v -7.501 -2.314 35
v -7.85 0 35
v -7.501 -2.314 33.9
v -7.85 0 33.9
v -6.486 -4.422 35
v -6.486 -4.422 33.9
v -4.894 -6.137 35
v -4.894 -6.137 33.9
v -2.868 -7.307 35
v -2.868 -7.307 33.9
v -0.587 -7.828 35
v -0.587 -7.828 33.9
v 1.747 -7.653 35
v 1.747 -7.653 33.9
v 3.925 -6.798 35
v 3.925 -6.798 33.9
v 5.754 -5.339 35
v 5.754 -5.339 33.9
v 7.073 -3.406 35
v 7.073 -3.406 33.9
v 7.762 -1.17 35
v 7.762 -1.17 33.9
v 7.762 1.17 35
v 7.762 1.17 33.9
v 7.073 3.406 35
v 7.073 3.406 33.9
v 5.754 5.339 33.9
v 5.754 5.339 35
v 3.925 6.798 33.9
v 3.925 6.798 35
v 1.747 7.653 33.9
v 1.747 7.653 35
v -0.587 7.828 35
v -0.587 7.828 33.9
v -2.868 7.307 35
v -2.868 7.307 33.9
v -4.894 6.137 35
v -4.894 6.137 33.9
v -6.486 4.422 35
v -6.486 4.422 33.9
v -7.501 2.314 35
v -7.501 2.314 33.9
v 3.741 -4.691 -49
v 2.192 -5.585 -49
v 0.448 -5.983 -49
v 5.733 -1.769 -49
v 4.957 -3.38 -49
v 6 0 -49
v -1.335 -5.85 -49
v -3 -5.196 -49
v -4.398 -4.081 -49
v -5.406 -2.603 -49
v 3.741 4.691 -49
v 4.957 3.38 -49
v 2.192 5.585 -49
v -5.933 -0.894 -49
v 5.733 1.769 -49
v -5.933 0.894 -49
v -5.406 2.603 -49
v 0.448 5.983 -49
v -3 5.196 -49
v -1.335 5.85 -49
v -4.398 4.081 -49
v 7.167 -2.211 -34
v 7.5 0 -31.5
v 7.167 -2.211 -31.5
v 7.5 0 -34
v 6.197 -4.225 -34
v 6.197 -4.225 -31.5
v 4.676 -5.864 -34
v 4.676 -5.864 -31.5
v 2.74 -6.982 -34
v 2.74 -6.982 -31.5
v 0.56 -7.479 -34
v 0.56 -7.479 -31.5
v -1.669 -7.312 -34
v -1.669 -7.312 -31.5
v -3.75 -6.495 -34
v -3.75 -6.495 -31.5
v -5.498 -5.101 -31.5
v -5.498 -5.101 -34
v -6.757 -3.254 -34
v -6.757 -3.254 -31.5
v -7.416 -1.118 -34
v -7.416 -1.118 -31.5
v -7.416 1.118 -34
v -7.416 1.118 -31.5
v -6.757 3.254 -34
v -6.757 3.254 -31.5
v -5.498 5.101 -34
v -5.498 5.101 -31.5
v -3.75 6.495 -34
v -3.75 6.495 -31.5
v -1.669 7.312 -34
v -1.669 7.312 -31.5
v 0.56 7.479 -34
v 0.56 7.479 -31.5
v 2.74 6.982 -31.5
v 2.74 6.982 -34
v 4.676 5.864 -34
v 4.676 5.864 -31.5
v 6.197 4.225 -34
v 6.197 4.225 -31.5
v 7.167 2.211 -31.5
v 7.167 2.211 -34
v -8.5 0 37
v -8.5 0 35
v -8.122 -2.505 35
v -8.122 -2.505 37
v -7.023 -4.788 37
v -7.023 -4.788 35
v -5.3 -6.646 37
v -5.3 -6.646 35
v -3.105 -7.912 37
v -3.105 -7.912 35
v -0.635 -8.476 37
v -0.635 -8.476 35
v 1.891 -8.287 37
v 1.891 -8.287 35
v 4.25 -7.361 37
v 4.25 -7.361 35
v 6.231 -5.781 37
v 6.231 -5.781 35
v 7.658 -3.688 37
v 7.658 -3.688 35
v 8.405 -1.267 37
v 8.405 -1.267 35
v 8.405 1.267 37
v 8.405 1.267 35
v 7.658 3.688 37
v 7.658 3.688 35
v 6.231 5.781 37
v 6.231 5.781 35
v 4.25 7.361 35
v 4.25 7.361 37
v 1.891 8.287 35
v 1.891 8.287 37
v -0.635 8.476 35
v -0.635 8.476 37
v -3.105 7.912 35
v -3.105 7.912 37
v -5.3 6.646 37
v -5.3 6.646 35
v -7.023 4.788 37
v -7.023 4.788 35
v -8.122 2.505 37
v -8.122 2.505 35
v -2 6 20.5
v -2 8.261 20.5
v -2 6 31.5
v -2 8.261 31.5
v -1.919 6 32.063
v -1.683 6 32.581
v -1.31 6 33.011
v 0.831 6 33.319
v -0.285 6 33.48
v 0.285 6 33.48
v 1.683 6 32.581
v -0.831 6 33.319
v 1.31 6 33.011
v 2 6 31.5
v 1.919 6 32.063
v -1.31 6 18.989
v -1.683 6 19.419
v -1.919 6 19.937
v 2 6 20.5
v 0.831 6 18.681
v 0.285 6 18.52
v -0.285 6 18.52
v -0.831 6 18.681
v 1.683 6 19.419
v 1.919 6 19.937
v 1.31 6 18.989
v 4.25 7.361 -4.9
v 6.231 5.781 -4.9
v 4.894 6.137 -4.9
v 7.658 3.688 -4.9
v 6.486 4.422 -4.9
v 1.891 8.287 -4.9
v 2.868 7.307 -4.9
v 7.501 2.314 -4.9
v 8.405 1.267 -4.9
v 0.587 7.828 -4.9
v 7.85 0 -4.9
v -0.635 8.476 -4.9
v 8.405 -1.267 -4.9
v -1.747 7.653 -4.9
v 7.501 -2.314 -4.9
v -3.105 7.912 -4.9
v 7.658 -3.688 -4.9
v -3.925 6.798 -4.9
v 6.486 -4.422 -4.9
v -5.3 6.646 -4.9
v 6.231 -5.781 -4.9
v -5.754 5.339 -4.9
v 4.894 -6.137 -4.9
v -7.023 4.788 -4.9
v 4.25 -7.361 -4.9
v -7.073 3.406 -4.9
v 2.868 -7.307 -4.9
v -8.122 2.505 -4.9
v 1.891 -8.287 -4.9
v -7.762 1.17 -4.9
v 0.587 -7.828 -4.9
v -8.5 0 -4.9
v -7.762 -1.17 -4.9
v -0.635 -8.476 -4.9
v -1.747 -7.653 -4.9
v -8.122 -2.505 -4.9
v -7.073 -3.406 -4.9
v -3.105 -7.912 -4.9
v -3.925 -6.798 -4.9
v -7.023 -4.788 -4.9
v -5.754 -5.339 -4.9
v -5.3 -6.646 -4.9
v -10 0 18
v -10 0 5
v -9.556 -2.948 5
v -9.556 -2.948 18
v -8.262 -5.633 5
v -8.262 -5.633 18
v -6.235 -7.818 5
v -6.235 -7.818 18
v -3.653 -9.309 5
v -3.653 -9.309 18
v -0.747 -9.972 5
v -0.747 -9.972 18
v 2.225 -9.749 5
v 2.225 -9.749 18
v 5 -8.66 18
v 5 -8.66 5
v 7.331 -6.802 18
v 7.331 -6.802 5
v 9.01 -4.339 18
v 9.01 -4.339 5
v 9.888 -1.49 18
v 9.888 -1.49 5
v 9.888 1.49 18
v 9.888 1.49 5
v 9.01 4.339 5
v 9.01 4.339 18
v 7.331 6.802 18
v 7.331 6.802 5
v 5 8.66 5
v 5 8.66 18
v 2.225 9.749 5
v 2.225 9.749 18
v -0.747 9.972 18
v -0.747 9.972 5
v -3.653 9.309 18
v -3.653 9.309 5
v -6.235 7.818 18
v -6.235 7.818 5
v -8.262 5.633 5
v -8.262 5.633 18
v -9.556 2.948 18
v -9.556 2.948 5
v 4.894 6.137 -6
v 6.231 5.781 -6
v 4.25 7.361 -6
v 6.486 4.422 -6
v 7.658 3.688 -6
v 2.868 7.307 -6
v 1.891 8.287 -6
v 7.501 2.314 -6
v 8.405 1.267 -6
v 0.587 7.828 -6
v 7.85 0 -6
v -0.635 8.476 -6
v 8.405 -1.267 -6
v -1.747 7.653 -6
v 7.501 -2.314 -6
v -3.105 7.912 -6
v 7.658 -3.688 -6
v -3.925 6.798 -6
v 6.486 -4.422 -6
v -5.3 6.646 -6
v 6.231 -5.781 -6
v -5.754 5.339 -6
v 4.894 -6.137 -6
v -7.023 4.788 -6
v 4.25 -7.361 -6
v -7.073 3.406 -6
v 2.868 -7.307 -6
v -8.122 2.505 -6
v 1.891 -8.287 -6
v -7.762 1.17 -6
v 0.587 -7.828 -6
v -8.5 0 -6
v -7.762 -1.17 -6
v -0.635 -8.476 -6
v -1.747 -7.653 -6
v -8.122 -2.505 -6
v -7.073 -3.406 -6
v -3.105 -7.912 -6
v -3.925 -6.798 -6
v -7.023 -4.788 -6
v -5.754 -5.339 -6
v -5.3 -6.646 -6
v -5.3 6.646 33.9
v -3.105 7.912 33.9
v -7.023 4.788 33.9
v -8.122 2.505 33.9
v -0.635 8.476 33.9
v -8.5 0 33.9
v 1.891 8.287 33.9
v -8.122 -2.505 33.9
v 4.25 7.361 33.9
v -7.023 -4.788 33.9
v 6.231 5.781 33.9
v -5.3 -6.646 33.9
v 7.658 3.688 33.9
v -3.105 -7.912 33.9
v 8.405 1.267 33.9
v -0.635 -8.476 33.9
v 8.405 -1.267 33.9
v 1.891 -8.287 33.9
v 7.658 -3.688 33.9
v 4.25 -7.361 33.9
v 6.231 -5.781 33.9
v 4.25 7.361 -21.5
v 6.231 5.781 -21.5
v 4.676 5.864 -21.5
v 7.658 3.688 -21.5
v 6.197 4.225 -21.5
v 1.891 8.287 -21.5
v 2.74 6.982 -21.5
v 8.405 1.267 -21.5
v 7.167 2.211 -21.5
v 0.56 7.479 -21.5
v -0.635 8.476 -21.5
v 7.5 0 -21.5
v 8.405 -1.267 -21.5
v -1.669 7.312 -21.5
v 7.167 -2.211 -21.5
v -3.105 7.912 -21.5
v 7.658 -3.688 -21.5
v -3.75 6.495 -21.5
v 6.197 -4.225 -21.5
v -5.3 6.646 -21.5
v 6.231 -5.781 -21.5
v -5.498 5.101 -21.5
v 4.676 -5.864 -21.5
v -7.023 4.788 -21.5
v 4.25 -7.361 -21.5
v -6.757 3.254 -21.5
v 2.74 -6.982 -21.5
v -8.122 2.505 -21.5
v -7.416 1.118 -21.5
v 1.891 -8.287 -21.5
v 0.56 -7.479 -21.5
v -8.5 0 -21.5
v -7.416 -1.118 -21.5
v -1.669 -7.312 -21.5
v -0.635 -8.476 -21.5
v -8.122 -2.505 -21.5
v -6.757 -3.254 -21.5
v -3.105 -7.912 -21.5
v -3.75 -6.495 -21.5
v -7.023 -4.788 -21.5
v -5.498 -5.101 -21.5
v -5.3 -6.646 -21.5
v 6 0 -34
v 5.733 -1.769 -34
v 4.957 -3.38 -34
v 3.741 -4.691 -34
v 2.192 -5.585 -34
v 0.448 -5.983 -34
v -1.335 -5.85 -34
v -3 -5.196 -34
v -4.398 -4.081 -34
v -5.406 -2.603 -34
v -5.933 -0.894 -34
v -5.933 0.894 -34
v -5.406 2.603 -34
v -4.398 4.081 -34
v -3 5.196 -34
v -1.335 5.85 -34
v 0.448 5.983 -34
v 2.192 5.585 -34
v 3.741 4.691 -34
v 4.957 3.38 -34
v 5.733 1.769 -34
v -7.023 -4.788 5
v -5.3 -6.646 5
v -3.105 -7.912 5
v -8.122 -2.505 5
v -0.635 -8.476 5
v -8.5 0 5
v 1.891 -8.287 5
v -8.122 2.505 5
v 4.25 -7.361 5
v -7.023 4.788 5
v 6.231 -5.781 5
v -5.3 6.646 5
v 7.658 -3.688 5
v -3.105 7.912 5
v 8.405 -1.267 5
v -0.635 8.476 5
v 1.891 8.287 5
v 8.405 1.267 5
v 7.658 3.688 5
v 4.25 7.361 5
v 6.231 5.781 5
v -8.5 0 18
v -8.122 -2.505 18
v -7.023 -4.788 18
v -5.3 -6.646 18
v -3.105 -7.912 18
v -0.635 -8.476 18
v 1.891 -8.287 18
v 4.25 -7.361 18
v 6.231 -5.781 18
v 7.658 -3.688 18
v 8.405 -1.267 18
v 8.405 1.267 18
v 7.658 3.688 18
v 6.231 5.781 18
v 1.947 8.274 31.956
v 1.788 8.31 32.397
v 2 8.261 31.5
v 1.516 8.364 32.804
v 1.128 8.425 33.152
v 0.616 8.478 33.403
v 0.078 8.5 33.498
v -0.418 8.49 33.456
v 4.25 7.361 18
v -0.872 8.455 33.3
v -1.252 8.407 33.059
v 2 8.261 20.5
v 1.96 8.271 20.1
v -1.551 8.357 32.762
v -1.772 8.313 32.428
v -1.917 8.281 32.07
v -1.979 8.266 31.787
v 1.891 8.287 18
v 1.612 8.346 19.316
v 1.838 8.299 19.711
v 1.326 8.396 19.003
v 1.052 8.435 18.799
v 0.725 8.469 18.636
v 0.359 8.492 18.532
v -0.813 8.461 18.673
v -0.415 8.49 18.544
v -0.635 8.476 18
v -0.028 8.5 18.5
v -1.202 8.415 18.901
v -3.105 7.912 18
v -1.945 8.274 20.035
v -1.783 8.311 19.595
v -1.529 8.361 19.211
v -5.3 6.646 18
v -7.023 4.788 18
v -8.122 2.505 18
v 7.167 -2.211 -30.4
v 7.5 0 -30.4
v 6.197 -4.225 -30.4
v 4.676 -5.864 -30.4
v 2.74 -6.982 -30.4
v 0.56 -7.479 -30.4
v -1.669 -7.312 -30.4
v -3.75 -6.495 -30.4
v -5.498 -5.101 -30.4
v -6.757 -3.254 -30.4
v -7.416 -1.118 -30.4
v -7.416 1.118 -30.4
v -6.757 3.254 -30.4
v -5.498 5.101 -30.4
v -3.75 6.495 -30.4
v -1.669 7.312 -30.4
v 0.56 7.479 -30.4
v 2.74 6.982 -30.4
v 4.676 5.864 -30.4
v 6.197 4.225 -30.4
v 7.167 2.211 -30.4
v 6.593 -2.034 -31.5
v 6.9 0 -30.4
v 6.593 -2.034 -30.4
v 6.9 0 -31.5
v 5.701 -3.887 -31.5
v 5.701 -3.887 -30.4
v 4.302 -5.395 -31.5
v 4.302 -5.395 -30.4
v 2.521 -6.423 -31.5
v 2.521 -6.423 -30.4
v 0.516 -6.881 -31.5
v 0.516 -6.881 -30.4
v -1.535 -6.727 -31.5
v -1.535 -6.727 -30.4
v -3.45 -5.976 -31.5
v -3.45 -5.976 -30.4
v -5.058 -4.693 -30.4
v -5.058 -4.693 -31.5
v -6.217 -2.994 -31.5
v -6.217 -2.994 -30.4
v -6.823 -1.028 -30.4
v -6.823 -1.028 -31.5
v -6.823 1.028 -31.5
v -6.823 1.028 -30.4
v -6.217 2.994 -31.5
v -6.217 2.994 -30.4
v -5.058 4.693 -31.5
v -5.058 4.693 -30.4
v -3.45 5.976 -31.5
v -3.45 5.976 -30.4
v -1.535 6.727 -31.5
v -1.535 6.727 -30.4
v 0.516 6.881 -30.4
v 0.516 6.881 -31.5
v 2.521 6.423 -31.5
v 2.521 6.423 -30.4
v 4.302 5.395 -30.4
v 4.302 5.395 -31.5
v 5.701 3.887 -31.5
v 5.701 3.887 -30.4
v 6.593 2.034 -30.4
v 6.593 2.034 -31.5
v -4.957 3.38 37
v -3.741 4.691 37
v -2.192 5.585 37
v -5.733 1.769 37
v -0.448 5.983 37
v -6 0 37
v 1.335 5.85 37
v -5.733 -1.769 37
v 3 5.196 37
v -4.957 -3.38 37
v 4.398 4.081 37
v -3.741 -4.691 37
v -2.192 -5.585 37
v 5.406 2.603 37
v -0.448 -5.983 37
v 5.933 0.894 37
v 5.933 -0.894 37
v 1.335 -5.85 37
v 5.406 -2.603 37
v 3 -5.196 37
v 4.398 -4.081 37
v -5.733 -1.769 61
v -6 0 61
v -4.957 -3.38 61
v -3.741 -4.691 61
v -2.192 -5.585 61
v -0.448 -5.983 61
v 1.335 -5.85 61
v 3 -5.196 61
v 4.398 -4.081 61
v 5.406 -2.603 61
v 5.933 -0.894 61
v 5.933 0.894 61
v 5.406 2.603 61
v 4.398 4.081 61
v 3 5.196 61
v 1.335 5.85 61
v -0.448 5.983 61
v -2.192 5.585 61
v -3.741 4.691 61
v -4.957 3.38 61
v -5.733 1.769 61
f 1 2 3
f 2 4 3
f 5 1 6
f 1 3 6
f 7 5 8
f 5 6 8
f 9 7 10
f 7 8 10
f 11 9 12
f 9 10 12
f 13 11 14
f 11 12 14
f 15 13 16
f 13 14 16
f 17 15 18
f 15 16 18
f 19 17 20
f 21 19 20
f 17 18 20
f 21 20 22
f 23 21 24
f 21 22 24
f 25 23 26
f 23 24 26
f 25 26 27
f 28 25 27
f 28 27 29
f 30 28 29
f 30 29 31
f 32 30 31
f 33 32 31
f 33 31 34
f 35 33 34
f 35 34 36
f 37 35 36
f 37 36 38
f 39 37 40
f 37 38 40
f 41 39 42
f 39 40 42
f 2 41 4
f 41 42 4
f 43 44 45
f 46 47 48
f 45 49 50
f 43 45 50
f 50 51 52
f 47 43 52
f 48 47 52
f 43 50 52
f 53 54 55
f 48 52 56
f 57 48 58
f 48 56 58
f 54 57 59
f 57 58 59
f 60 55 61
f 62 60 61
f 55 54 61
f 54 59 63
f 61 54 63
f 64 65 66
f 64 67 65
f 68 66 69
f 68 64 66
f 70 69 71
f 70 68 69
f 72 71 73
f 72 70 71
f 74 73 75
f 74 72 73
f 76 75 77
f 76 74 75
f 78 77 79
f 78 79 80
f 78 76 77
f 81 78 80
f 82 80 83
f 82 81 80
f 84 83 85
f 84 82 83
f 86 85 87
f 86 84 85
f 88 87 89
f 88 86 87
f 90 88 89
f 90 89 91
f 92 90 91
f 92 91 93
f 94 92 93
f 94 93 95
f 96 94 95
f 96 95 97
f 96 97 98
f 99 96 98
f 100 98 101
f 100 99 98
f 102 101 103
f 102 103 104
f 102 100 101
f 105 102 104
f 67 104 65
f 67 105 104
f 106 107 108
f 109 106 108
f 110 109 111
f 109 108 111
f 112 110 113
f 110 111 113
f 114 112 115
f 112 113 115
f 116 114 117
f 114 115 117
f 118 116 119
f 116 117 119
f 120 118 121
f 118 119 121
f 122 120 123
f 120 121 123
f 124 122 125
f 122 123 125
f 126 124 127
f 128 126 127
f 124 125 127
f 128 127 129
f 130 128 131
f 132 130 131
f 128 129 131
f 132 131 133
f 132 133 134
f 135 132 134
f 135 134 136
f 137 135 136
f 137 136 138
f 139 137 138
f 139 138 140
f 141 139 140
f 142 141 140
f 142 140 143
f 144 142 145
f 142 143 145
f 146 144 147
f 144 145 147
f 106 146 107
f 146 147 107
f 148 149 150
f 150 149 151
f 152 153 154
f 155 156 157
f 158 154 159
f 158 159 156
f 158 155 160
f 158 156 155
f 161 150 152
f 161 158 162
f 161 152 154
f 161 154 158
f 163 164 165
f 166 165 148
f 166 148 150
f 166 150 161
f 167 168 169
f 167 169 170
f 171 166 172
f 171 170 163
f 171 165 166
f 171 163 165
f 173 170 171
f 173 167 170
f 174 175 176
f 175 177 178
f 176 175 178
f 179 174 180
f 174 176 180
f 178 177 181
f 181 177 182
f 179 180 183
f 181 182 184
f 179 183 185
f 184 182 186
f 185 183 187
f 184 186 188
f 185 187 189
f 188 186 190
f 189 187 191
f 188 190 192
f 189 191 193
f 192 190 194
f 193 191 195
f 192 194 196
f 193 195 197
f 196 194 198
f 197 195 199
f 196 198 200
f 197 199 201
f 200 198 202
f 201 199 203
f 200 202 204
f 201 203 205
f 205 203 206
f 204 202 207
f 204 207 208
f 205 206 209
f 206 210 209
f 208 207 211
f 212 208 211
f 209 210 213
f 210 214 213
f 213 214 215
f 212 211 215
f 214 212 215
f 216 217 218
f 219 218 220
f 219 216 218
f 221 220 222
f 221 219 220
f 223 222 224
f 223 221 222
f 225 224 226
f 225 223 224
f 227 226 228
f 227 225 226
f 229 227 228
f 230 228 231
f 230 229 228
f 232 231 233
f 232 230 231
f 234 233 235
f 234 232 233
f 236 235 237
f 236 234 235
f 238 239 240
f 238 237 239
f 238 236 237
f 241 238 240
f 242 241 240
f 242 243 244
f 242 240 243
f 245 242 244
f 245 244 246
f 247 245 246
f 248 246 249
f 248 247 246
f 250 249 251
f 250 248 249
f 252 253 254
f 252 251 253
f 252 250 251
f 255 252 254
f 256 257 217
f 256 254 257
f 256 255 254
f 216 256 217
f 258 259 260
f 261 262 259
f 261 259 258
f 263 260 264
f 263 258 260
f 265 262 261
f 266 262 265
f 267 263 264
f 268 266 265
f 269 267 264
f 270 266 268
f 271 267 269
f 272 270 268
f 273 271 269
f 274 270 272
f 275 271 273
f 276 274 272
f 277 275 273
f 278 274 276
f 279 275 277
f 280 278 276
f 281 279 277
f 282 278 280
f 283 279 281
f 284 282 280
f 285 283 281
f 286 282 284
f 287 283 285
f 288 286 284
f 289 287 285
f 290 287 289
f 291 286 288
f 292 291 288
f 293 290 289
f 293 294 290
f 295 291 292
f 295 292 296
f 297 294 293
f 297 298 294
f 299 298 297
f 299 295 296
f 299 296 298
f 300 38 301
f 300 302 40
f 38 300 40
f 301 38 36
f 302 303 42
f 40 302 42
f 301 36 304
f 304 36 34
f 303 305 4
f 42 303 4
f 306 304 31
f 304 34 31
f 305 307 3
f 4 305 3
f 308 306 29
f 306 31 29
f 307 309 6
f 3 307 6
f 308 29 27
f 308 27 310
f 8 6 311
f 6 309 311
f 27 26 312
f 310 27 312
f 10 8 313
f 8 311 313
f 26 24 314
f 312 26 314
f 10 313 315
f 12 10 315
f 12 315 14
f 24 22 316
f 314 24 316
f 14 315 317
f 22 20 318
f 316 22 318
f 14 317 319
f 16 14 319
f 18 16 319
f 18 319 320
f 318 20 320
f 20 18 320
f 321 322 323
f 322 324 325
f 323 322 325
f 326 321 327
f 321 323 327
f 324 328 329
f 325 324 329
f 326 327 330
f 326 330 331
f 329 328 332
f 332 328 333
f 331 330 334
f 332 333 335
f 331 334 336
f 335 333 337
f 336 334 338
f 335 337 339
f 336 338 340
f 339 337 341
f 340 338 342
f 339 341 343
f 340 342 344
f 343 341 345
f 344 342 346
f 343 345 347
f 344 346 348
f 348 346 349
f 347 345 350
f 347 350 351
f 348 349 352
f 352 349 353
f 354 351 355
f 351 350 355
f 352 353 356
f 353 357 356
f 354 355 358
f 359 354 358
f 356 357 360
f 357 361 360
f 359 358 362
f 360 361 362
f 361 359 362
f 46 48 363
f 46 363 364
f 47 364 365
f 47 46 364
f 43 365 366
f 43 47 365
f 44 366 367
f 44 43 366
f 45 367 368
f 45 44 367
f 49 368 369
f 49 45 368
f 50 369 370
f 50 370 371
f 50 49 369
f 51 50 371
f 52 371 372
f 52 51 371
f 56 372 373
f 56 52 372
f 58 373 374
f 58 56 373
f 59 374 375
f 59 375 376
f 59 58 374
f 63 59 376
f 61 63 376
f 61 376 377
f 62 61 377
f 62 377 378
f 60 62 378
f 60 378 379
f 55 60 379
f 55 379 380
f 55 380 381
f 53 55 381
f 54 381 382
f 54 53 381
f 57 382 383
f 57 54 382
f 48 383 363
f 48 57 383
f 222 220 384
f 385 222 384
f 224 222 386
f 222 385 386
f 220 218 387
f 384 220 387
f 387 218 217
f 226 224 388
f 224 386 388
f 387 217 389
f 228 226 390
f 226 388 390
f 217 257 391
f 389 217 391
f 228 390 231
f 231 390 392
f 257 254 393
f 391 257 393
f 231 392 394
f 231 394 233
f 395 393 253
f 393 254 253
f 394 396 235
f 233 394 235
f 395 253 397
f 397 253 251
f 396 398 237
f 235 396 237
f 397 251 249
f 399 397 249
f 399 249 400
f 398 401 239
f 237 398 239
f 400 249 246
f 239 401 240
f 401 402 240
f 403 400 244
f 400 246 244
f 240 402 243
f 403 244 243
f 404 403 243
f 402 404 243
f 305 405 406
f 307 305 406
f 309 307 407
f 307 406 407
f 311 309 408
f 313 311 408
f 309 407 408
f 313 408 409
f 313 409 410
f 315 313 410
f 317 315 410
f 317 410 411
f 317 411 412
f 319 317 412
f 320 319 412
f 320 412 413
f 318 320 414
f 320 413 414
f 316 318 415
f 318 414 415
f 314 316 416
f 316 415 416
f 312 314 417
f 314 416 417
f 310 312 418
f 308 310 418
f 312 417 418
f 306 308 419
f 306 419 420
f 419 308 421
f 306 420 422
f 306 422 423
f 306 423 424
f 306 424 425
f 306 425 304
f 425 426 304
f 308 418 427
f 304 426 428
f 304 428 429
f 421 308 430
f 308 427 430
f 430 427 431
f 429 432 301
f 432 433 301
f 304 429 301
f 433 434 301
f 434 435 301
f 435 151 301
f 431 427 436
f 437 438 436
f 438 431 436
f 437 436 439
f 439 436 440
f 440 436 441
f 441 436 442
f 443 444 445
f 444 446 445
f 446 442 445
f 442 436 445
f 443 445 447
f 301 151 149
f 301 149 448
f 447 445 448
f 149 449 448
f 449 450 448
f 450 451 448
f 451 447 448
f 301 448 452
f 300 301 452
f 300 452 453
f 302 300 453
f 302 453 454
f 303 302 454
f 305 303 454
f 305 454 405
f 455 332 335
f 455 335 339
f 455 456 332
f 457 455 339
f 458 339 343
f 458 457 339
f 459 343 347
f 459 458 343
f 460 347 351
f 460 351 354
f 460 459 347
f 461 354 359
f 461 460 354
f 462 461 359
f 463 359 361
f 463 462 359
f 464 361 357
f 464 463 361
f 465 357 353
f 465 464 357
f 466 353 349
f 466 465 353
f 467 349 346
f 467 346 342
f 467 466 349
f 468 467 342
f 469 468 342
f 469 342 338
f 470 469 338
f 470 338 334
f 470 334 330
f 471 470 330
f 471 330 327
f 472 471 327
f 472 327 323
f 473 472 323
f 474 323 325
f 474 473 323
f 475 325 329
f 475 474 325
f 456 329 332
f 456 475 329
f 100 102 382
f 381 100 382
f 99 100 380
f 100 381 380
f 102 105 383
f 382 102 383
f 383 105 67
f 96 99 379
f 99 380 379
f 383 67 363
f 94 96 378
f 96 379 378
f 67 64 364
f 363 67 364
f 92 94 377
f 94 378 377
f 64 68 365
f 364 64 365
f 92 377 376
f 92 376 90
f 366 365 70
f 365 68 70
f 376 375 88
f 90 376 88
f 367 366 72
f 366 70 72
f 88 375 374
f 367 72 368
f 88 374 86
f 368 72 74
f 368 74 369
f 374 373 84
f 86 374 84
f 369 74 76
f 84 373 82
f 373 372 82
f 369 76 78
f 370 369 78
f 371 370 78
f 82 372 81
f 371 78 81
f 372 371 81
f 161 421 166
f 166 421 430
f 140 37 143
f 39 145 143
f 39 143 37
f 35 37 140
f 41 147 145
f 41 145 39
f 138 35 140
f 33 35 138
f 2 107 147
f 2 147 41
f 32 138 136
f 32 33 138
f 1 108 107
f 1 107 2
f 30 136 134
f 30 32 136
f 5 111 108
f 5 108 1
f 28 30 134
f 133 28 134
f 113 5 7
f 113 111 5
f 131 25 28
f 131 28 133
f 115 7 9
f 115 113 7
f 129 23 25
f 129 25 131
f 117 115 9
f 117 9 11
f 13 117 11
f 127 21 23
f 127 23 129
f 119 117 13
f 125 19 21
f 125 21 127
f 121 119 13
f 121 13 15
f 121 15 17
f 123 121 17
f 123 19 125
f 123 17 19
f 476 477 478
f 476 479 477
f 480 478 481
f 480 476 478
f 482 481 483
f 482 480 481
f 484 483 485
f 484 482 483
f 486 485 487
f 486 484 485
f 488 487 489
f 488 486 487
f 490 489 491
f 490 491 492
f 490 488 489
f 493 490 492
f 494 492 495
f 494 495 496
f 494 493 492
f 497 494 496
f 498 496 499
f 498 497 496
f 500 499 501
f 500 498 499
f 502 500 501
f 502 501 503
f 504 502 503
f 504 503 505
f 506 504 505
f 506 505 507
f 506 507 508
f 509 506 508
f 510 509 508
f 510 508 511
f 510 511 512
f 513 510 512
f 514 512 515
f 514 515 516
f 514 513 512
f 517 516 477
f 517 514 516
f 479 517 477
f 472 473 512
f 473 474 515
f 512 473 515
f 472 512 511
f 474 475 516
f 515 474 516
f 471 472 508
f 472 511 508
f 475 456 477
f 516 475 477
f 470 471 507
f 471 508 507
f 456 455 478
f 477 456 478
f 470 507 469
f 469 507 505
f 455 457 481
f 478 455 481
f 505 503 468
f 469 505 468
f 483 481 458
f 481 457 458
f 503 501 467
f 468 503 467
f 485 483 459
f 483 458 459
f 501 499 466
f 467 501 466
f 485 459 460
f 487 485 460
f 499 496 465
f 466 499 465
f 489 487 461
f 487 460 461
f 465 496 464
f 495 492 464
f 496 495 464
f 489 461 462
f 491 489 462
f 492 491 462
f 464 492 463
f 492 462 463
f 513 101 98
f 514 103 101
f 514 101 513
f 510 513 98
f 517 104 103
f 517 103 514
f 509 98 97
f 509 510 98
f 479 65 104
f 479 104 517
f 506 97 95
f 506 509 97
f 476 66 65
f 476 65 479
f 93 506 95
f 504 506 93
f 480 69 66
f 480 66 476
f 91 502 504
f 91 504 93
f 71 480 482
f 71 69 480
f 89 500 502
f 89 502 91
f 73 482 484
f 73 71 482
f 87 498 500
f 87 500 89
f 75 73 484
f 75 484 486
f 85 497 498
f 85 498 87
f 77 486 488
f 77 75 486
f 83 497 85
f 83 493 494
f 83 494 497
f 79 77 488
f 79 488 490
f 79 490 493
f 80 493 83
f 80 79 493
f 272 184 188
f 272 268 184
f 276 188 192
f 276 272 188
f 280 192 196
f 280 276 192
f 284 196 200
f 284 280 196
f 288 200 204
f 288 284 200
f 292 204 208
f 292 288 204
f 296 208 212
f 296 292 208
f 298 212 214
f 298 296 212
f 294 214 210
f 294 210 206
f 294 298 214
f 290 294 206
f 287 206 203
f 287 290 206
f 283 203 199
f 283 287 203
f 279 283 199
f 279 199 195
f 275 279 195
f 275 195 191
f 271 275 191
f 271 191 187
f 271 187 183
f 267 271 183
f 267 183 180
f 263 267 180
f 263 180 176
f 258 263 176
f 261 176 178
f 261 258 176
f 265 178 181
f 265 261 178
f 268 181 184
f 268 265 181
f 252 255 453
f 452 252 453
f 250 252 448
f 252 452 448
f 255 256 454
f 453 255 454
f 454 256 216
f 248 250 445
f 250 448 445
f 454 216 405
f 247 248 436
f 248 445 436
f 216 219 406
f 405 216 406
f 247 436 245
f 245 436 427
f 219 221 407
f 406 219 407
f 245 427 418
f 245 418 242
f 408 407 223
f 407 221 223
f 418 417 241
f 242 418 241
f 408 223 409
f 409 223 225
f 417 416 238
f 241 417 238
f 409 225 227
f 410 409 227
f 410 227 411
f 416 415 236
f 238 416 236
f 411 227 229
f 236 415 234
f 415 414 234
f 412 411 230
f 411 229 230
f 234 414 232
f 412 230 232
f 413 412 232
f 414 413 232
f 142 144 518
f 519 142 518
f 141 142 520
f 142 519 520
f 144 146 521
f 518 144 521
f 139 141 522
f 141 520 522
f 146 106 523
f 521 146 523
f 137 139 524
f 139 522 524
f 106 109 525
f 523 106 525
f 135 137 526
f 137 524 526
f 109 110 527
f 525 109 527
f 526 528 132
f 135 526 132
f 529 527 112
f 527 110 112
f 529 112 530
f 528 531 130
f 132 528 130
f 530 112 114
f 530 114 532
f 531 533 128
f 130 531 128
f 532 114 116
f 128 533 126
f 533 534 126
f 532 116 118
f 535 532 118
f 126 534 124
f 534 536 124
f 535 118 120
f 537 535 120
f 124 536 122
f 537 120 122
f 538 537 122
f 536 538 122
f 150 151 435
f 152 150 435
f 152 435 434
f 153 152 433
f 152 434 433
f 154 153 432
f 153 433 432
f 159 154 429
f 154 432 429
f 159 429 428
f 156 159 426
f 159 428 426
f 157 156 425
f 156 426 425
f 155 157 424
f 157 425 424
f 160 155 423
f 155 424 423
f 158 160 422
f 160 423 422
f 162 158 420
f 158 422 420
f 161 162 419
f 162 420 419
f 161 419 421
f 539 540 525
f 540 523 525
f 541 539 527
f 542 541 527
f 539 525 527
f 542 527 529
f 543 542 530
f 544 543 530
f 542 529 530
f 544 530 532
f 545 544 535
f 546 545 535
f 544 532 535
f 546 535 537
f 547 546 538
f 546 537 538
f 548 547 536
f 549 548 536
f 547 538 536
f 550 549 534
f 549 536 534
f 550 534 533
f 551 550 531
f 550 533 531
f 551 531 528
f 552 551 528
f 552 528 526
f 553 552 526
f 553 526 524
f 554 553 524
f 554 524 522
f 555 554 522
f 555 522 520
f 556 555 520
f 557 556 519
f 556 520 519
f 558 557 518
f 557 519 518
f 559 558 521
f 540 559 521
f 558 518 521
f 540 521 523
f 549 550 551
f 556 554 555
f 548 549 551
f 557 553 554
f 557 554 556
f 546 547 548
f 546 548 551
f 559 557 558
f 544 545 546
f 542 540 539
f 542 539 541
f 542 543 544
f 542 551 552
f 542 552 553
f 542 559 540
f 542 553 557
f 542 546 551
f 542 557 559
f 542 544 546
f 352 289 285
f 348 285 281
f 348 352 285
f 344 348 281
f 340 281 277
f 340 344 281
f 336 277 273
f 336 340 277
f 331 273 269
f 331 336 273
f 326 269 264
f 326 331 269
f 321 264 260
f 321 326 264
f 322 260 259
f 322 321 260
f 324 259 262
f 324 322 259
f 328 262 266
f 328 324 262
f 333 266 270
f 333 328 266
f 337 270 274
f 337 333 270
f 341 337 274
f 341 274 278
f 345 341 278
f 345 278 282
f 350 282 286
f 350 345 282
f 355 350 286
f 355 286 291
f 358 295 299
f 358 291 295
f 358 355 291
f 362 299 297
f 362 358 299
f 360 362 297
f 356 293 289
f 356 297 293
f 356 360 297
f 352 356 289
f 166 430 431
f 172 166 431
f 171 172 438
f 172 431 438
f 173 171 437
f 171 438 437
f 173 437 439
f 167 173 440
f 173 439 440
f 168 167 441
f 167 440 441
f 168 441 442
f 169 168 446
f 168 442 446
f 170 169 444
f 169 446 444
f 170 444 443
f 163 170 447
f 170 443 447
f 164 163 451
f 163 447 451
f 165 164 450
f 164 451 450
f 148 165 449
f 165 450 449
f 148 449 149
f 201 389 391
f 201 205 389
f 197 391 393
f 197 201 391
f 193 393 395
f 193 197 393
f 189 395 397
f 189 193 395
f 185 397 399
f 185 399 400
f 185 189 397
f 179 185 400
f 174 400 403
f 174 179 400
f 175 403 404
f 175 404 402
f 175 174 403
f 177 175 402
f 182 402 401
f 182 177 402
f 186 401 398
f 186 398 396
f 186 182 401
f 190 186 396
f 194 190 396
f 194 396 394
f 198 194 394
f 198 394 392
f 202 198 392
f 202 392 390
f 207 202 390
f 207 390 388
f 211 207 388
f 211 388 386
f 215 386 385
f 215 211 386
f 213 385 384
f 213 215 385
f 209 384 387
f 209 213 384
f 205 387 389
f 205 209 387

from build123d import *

# Parameters (mm, degrees)
SKETCH1_R               = 10
BOSS_EXTRUDE1_DEPTH     = 61
SKETCH3_W               = 66
SKETCH3_H               = 1.5
SKETCH4_W               = 43
SKETCH4_H               = 1.5
SKETCH5_W               = 24
SKETCH5_H               = 2.5
SKETCH6_W               = 39.5
SKETCH6_H               = 1
SKETCH7_W               = 27
SKETCH7_H               = 1.5
SKETCH8_W               = 1.1
SKETCH8_H               = 0.6
SKETCH9_W               = 1.1
SKETCH9_H               = 0.65
SKETCH10_W              = 1.1
SKETCH10_H              = 0.65
CUT_EXTRUDE1_DEPTH      = 63.617888818
CUT_EXTRUDE1_DEPTH_BACK = 63.617888818
SKETCH11_W              = 12
SKETCH11_H              = 12
CUT_EXTRUDE2_DEPTH      = 2.5


with BuildPart() as part:
    # Sketch1 → Boss-Extrude1 (new, symmetric)
    with BuildSketch(Plane.XY):
        with Locations(Location((0, 0, 0), (0, 0, 180))):
            Circle(SKETCH1_R)
    extrude(amount=BOSS_EXTRUDE1_DEPTH, both=True)

    # Sketch3 → Cut-Revolve1 (revolve, cut)
    with BuildSketch(Plane(origin=(0, 0, 0), x_dir=(0, 0, -1), z_dir=(1, 0, 0)), mode=Mode.PRIVATE) as cut_revolve1_sk:
        with Locations((28, 9.25)):
            Rectangle(SKETCH3_W, SKETCH3_H)
    revolve(cut_revolve1_sk.sketch.rotate(Axis((0, 0, 0), (0, 0, -1)), 270), axis=Axis((0, 0, 0), (0, 0, -1)), mode=Mode.SUBTRACT)

    # Sketch4 → Cut-Revolve2 (revolve, cut)
    with BuildSketch(Plane(origin=(0, 0, 0), x_dir=(0, 0, -1), z_dir=(1, 0, 0)), mode=Mode.PRIVATE) as cut_revolve2_sk:
        with Locations((-39.5, 9.25)):
            Rectangle(SKETCH4_W, SKETCH4_H)
    revolve(cut_revolve2_sk.sketch.rotate(Axis((0, 0, 0), (0, 0, 1)), 90), axis=Axis((0, 0, 0), (0, 0, 1)), mode=Mode.SUBTRACT)

    # Sketch5 → Cut-Revolve3 (revolve, cut)
    with BuildSketch(Plane(origin=(0, 0, 0), x_dir=(0, 0, -1), z_dir=(1, 0, 0)), mode=Mode.PRIVATE) as cut_revolve3_sk:
        with Locations((-49, 7.25)):
            Rectangle(SKETCH5_W, SKETCH5_H)
    revolve(cut_revolve3_sk.sketch.rotate(Axis((0, 0, 0), (0, 0, 1)), 90), axis=Axis((0, 0, 0), (0, 0, 1)), mode=Mode.SUBTRACT)

    # Sketch6 → Cut-Revolve4 (revolve, cut)
    with BuildSketch(Plane(origin=(0, 0, 0), x_dir=(0, 0, -1), z_dir=(1, 0, 0)), mode=Mode.PRIVATE) as cut_revolve4_sk:
        with Locations((41.25, 8)):
            Rectangle(SKETCH6_W, SKETCH6_H)
    revolve(cut_revolve4_sk.sketch.rotate(Axis((0, 0, 0), (0, 0, -1)), 90), axis=Axis((0, 0, 0), (0, 0, -1)), mode=Mode.SUBTRACT)

    # Sketch7 → Cut-Revolve5 (revolve, cut)
    with BuildSketch(Plane(origin=(0, 0, 0), x_dir=(0, 0, -1), z_dir=(1, 0, 0)), mode=Mode.PRIVATE) as cut_revolve5_sk:
        with Locations((47.5, 6.75)):
            Rectangle(SKETCH7_W, SKETCH7_H)
    revolve(cut_revolve5_sk.sketch.rotate(Axis((0, 0, 0), (0, 0, -1)), 90), axis=Axis((0, 0, 0), (0, 0, -1)), mode=Mode.SUBTRACT)

    # Sketch8 → Cut-Revolve6 (revolve, cut)
    with BuildSketch(Plane(origin=(0, 0, 0), x_dir=(0, 0, -1), z_dir=(1, 0, 0)), mode=Mode.PRIVATE) as cut_revolve6_sk:
        with Locations((30.95, 7.2)):
            Rectangle(SKETCH8_W, SKETCH8_H)
    revolve(cut_revolve6_sk.sketch.rotate(Axis((0, 0, 0), (0, 0, -1)), 90), axis=Axis((0, 0, 0), (0, 0, -1)), mode=Mode.SUBTRACT)

    # Sketch9 → Cut-Revolve7 (revolve, cut)
    with BuildSketch(Plane(origin=(0, 0, 0), x_dir=(0, 0, -1), z_dir=(1, 0, 0)), mode=Mode.PRIVATE) as cut_revolve7_sk:
        with Locations((5.45, 8.175)):
            Rectangle(SKETCH9_W, SKETCH9_H)
    revolve(cut_revolve7_sk.sketch.rotate(Axis((0, 0, 0), (0, 0, -1)), 90), axis=Axis((0, 0, 0), (0, 0, -1)), mode=Mode.SUBTRACT)

    # Sketch10 → Cut-Revolve8 (revolve, cut)
    with BuildSketch(Plane(origin=(0, 0, 0), x_dir=(0, 0, -1), z_dir=(1, 0, 0)), mode=Mode.PRIVATE) as cut_revolve8_sk:
        with Locations((-34.45, 8.175)):
            Rectangle(SKETCH10_W, SKETCH10_H)
    revolve(cut_revolve8_sk.sketch.rotate(Axis((0, 0, 0), (0, 0, 1)), 90), axis=Axis((0, 0, 0), (0, 0, 1)), mode=Mode.SUBTRACT)

    # Sketch11 → Cut-Extrude1 (cut, two sides: drawn at the far end of the back side and taken through both)
    with BuildSketch(Plane(origin=(0, 0, 0), x_dir=(0, 0, -1), z_dir=(1, 0, 0)).offset(-CUT_EXTRUDE1_DEPTH_BACK)):
        with Locations((55, 0)):
            Rectangle(SKETCH11_W, SKETCH11_H)
    extrude(amount=CUT_EXTRUDE1_DEPTH + CUT_EXTRUDE1_DEPTH_BACK, mode=Mode.SUBTRACT)

    # Sketch12 → Cut-Extrude2 (cut)
    with BuildSketch(Plane(origin=(0, 8.5, 0), x_dir=(1, 0, 0), z_dir=(0, 1, 0))):
        with BuildLine():
            Line((2, -31.5), (2, -20.5))
            ThreePointArc((2, -20.5), (0, -18.5), (-2, -20.5))
            Line((-2, -20.5), (-2, -31.5))
            ThreePointArc((-2, -31.5), (0, -33.5), (2, -31.5))
        make_face()
    extrude(amount=-CUT_EXTRUDE2_DEPTH, mode=Mode.SUBTRACT)


solid = part.part
